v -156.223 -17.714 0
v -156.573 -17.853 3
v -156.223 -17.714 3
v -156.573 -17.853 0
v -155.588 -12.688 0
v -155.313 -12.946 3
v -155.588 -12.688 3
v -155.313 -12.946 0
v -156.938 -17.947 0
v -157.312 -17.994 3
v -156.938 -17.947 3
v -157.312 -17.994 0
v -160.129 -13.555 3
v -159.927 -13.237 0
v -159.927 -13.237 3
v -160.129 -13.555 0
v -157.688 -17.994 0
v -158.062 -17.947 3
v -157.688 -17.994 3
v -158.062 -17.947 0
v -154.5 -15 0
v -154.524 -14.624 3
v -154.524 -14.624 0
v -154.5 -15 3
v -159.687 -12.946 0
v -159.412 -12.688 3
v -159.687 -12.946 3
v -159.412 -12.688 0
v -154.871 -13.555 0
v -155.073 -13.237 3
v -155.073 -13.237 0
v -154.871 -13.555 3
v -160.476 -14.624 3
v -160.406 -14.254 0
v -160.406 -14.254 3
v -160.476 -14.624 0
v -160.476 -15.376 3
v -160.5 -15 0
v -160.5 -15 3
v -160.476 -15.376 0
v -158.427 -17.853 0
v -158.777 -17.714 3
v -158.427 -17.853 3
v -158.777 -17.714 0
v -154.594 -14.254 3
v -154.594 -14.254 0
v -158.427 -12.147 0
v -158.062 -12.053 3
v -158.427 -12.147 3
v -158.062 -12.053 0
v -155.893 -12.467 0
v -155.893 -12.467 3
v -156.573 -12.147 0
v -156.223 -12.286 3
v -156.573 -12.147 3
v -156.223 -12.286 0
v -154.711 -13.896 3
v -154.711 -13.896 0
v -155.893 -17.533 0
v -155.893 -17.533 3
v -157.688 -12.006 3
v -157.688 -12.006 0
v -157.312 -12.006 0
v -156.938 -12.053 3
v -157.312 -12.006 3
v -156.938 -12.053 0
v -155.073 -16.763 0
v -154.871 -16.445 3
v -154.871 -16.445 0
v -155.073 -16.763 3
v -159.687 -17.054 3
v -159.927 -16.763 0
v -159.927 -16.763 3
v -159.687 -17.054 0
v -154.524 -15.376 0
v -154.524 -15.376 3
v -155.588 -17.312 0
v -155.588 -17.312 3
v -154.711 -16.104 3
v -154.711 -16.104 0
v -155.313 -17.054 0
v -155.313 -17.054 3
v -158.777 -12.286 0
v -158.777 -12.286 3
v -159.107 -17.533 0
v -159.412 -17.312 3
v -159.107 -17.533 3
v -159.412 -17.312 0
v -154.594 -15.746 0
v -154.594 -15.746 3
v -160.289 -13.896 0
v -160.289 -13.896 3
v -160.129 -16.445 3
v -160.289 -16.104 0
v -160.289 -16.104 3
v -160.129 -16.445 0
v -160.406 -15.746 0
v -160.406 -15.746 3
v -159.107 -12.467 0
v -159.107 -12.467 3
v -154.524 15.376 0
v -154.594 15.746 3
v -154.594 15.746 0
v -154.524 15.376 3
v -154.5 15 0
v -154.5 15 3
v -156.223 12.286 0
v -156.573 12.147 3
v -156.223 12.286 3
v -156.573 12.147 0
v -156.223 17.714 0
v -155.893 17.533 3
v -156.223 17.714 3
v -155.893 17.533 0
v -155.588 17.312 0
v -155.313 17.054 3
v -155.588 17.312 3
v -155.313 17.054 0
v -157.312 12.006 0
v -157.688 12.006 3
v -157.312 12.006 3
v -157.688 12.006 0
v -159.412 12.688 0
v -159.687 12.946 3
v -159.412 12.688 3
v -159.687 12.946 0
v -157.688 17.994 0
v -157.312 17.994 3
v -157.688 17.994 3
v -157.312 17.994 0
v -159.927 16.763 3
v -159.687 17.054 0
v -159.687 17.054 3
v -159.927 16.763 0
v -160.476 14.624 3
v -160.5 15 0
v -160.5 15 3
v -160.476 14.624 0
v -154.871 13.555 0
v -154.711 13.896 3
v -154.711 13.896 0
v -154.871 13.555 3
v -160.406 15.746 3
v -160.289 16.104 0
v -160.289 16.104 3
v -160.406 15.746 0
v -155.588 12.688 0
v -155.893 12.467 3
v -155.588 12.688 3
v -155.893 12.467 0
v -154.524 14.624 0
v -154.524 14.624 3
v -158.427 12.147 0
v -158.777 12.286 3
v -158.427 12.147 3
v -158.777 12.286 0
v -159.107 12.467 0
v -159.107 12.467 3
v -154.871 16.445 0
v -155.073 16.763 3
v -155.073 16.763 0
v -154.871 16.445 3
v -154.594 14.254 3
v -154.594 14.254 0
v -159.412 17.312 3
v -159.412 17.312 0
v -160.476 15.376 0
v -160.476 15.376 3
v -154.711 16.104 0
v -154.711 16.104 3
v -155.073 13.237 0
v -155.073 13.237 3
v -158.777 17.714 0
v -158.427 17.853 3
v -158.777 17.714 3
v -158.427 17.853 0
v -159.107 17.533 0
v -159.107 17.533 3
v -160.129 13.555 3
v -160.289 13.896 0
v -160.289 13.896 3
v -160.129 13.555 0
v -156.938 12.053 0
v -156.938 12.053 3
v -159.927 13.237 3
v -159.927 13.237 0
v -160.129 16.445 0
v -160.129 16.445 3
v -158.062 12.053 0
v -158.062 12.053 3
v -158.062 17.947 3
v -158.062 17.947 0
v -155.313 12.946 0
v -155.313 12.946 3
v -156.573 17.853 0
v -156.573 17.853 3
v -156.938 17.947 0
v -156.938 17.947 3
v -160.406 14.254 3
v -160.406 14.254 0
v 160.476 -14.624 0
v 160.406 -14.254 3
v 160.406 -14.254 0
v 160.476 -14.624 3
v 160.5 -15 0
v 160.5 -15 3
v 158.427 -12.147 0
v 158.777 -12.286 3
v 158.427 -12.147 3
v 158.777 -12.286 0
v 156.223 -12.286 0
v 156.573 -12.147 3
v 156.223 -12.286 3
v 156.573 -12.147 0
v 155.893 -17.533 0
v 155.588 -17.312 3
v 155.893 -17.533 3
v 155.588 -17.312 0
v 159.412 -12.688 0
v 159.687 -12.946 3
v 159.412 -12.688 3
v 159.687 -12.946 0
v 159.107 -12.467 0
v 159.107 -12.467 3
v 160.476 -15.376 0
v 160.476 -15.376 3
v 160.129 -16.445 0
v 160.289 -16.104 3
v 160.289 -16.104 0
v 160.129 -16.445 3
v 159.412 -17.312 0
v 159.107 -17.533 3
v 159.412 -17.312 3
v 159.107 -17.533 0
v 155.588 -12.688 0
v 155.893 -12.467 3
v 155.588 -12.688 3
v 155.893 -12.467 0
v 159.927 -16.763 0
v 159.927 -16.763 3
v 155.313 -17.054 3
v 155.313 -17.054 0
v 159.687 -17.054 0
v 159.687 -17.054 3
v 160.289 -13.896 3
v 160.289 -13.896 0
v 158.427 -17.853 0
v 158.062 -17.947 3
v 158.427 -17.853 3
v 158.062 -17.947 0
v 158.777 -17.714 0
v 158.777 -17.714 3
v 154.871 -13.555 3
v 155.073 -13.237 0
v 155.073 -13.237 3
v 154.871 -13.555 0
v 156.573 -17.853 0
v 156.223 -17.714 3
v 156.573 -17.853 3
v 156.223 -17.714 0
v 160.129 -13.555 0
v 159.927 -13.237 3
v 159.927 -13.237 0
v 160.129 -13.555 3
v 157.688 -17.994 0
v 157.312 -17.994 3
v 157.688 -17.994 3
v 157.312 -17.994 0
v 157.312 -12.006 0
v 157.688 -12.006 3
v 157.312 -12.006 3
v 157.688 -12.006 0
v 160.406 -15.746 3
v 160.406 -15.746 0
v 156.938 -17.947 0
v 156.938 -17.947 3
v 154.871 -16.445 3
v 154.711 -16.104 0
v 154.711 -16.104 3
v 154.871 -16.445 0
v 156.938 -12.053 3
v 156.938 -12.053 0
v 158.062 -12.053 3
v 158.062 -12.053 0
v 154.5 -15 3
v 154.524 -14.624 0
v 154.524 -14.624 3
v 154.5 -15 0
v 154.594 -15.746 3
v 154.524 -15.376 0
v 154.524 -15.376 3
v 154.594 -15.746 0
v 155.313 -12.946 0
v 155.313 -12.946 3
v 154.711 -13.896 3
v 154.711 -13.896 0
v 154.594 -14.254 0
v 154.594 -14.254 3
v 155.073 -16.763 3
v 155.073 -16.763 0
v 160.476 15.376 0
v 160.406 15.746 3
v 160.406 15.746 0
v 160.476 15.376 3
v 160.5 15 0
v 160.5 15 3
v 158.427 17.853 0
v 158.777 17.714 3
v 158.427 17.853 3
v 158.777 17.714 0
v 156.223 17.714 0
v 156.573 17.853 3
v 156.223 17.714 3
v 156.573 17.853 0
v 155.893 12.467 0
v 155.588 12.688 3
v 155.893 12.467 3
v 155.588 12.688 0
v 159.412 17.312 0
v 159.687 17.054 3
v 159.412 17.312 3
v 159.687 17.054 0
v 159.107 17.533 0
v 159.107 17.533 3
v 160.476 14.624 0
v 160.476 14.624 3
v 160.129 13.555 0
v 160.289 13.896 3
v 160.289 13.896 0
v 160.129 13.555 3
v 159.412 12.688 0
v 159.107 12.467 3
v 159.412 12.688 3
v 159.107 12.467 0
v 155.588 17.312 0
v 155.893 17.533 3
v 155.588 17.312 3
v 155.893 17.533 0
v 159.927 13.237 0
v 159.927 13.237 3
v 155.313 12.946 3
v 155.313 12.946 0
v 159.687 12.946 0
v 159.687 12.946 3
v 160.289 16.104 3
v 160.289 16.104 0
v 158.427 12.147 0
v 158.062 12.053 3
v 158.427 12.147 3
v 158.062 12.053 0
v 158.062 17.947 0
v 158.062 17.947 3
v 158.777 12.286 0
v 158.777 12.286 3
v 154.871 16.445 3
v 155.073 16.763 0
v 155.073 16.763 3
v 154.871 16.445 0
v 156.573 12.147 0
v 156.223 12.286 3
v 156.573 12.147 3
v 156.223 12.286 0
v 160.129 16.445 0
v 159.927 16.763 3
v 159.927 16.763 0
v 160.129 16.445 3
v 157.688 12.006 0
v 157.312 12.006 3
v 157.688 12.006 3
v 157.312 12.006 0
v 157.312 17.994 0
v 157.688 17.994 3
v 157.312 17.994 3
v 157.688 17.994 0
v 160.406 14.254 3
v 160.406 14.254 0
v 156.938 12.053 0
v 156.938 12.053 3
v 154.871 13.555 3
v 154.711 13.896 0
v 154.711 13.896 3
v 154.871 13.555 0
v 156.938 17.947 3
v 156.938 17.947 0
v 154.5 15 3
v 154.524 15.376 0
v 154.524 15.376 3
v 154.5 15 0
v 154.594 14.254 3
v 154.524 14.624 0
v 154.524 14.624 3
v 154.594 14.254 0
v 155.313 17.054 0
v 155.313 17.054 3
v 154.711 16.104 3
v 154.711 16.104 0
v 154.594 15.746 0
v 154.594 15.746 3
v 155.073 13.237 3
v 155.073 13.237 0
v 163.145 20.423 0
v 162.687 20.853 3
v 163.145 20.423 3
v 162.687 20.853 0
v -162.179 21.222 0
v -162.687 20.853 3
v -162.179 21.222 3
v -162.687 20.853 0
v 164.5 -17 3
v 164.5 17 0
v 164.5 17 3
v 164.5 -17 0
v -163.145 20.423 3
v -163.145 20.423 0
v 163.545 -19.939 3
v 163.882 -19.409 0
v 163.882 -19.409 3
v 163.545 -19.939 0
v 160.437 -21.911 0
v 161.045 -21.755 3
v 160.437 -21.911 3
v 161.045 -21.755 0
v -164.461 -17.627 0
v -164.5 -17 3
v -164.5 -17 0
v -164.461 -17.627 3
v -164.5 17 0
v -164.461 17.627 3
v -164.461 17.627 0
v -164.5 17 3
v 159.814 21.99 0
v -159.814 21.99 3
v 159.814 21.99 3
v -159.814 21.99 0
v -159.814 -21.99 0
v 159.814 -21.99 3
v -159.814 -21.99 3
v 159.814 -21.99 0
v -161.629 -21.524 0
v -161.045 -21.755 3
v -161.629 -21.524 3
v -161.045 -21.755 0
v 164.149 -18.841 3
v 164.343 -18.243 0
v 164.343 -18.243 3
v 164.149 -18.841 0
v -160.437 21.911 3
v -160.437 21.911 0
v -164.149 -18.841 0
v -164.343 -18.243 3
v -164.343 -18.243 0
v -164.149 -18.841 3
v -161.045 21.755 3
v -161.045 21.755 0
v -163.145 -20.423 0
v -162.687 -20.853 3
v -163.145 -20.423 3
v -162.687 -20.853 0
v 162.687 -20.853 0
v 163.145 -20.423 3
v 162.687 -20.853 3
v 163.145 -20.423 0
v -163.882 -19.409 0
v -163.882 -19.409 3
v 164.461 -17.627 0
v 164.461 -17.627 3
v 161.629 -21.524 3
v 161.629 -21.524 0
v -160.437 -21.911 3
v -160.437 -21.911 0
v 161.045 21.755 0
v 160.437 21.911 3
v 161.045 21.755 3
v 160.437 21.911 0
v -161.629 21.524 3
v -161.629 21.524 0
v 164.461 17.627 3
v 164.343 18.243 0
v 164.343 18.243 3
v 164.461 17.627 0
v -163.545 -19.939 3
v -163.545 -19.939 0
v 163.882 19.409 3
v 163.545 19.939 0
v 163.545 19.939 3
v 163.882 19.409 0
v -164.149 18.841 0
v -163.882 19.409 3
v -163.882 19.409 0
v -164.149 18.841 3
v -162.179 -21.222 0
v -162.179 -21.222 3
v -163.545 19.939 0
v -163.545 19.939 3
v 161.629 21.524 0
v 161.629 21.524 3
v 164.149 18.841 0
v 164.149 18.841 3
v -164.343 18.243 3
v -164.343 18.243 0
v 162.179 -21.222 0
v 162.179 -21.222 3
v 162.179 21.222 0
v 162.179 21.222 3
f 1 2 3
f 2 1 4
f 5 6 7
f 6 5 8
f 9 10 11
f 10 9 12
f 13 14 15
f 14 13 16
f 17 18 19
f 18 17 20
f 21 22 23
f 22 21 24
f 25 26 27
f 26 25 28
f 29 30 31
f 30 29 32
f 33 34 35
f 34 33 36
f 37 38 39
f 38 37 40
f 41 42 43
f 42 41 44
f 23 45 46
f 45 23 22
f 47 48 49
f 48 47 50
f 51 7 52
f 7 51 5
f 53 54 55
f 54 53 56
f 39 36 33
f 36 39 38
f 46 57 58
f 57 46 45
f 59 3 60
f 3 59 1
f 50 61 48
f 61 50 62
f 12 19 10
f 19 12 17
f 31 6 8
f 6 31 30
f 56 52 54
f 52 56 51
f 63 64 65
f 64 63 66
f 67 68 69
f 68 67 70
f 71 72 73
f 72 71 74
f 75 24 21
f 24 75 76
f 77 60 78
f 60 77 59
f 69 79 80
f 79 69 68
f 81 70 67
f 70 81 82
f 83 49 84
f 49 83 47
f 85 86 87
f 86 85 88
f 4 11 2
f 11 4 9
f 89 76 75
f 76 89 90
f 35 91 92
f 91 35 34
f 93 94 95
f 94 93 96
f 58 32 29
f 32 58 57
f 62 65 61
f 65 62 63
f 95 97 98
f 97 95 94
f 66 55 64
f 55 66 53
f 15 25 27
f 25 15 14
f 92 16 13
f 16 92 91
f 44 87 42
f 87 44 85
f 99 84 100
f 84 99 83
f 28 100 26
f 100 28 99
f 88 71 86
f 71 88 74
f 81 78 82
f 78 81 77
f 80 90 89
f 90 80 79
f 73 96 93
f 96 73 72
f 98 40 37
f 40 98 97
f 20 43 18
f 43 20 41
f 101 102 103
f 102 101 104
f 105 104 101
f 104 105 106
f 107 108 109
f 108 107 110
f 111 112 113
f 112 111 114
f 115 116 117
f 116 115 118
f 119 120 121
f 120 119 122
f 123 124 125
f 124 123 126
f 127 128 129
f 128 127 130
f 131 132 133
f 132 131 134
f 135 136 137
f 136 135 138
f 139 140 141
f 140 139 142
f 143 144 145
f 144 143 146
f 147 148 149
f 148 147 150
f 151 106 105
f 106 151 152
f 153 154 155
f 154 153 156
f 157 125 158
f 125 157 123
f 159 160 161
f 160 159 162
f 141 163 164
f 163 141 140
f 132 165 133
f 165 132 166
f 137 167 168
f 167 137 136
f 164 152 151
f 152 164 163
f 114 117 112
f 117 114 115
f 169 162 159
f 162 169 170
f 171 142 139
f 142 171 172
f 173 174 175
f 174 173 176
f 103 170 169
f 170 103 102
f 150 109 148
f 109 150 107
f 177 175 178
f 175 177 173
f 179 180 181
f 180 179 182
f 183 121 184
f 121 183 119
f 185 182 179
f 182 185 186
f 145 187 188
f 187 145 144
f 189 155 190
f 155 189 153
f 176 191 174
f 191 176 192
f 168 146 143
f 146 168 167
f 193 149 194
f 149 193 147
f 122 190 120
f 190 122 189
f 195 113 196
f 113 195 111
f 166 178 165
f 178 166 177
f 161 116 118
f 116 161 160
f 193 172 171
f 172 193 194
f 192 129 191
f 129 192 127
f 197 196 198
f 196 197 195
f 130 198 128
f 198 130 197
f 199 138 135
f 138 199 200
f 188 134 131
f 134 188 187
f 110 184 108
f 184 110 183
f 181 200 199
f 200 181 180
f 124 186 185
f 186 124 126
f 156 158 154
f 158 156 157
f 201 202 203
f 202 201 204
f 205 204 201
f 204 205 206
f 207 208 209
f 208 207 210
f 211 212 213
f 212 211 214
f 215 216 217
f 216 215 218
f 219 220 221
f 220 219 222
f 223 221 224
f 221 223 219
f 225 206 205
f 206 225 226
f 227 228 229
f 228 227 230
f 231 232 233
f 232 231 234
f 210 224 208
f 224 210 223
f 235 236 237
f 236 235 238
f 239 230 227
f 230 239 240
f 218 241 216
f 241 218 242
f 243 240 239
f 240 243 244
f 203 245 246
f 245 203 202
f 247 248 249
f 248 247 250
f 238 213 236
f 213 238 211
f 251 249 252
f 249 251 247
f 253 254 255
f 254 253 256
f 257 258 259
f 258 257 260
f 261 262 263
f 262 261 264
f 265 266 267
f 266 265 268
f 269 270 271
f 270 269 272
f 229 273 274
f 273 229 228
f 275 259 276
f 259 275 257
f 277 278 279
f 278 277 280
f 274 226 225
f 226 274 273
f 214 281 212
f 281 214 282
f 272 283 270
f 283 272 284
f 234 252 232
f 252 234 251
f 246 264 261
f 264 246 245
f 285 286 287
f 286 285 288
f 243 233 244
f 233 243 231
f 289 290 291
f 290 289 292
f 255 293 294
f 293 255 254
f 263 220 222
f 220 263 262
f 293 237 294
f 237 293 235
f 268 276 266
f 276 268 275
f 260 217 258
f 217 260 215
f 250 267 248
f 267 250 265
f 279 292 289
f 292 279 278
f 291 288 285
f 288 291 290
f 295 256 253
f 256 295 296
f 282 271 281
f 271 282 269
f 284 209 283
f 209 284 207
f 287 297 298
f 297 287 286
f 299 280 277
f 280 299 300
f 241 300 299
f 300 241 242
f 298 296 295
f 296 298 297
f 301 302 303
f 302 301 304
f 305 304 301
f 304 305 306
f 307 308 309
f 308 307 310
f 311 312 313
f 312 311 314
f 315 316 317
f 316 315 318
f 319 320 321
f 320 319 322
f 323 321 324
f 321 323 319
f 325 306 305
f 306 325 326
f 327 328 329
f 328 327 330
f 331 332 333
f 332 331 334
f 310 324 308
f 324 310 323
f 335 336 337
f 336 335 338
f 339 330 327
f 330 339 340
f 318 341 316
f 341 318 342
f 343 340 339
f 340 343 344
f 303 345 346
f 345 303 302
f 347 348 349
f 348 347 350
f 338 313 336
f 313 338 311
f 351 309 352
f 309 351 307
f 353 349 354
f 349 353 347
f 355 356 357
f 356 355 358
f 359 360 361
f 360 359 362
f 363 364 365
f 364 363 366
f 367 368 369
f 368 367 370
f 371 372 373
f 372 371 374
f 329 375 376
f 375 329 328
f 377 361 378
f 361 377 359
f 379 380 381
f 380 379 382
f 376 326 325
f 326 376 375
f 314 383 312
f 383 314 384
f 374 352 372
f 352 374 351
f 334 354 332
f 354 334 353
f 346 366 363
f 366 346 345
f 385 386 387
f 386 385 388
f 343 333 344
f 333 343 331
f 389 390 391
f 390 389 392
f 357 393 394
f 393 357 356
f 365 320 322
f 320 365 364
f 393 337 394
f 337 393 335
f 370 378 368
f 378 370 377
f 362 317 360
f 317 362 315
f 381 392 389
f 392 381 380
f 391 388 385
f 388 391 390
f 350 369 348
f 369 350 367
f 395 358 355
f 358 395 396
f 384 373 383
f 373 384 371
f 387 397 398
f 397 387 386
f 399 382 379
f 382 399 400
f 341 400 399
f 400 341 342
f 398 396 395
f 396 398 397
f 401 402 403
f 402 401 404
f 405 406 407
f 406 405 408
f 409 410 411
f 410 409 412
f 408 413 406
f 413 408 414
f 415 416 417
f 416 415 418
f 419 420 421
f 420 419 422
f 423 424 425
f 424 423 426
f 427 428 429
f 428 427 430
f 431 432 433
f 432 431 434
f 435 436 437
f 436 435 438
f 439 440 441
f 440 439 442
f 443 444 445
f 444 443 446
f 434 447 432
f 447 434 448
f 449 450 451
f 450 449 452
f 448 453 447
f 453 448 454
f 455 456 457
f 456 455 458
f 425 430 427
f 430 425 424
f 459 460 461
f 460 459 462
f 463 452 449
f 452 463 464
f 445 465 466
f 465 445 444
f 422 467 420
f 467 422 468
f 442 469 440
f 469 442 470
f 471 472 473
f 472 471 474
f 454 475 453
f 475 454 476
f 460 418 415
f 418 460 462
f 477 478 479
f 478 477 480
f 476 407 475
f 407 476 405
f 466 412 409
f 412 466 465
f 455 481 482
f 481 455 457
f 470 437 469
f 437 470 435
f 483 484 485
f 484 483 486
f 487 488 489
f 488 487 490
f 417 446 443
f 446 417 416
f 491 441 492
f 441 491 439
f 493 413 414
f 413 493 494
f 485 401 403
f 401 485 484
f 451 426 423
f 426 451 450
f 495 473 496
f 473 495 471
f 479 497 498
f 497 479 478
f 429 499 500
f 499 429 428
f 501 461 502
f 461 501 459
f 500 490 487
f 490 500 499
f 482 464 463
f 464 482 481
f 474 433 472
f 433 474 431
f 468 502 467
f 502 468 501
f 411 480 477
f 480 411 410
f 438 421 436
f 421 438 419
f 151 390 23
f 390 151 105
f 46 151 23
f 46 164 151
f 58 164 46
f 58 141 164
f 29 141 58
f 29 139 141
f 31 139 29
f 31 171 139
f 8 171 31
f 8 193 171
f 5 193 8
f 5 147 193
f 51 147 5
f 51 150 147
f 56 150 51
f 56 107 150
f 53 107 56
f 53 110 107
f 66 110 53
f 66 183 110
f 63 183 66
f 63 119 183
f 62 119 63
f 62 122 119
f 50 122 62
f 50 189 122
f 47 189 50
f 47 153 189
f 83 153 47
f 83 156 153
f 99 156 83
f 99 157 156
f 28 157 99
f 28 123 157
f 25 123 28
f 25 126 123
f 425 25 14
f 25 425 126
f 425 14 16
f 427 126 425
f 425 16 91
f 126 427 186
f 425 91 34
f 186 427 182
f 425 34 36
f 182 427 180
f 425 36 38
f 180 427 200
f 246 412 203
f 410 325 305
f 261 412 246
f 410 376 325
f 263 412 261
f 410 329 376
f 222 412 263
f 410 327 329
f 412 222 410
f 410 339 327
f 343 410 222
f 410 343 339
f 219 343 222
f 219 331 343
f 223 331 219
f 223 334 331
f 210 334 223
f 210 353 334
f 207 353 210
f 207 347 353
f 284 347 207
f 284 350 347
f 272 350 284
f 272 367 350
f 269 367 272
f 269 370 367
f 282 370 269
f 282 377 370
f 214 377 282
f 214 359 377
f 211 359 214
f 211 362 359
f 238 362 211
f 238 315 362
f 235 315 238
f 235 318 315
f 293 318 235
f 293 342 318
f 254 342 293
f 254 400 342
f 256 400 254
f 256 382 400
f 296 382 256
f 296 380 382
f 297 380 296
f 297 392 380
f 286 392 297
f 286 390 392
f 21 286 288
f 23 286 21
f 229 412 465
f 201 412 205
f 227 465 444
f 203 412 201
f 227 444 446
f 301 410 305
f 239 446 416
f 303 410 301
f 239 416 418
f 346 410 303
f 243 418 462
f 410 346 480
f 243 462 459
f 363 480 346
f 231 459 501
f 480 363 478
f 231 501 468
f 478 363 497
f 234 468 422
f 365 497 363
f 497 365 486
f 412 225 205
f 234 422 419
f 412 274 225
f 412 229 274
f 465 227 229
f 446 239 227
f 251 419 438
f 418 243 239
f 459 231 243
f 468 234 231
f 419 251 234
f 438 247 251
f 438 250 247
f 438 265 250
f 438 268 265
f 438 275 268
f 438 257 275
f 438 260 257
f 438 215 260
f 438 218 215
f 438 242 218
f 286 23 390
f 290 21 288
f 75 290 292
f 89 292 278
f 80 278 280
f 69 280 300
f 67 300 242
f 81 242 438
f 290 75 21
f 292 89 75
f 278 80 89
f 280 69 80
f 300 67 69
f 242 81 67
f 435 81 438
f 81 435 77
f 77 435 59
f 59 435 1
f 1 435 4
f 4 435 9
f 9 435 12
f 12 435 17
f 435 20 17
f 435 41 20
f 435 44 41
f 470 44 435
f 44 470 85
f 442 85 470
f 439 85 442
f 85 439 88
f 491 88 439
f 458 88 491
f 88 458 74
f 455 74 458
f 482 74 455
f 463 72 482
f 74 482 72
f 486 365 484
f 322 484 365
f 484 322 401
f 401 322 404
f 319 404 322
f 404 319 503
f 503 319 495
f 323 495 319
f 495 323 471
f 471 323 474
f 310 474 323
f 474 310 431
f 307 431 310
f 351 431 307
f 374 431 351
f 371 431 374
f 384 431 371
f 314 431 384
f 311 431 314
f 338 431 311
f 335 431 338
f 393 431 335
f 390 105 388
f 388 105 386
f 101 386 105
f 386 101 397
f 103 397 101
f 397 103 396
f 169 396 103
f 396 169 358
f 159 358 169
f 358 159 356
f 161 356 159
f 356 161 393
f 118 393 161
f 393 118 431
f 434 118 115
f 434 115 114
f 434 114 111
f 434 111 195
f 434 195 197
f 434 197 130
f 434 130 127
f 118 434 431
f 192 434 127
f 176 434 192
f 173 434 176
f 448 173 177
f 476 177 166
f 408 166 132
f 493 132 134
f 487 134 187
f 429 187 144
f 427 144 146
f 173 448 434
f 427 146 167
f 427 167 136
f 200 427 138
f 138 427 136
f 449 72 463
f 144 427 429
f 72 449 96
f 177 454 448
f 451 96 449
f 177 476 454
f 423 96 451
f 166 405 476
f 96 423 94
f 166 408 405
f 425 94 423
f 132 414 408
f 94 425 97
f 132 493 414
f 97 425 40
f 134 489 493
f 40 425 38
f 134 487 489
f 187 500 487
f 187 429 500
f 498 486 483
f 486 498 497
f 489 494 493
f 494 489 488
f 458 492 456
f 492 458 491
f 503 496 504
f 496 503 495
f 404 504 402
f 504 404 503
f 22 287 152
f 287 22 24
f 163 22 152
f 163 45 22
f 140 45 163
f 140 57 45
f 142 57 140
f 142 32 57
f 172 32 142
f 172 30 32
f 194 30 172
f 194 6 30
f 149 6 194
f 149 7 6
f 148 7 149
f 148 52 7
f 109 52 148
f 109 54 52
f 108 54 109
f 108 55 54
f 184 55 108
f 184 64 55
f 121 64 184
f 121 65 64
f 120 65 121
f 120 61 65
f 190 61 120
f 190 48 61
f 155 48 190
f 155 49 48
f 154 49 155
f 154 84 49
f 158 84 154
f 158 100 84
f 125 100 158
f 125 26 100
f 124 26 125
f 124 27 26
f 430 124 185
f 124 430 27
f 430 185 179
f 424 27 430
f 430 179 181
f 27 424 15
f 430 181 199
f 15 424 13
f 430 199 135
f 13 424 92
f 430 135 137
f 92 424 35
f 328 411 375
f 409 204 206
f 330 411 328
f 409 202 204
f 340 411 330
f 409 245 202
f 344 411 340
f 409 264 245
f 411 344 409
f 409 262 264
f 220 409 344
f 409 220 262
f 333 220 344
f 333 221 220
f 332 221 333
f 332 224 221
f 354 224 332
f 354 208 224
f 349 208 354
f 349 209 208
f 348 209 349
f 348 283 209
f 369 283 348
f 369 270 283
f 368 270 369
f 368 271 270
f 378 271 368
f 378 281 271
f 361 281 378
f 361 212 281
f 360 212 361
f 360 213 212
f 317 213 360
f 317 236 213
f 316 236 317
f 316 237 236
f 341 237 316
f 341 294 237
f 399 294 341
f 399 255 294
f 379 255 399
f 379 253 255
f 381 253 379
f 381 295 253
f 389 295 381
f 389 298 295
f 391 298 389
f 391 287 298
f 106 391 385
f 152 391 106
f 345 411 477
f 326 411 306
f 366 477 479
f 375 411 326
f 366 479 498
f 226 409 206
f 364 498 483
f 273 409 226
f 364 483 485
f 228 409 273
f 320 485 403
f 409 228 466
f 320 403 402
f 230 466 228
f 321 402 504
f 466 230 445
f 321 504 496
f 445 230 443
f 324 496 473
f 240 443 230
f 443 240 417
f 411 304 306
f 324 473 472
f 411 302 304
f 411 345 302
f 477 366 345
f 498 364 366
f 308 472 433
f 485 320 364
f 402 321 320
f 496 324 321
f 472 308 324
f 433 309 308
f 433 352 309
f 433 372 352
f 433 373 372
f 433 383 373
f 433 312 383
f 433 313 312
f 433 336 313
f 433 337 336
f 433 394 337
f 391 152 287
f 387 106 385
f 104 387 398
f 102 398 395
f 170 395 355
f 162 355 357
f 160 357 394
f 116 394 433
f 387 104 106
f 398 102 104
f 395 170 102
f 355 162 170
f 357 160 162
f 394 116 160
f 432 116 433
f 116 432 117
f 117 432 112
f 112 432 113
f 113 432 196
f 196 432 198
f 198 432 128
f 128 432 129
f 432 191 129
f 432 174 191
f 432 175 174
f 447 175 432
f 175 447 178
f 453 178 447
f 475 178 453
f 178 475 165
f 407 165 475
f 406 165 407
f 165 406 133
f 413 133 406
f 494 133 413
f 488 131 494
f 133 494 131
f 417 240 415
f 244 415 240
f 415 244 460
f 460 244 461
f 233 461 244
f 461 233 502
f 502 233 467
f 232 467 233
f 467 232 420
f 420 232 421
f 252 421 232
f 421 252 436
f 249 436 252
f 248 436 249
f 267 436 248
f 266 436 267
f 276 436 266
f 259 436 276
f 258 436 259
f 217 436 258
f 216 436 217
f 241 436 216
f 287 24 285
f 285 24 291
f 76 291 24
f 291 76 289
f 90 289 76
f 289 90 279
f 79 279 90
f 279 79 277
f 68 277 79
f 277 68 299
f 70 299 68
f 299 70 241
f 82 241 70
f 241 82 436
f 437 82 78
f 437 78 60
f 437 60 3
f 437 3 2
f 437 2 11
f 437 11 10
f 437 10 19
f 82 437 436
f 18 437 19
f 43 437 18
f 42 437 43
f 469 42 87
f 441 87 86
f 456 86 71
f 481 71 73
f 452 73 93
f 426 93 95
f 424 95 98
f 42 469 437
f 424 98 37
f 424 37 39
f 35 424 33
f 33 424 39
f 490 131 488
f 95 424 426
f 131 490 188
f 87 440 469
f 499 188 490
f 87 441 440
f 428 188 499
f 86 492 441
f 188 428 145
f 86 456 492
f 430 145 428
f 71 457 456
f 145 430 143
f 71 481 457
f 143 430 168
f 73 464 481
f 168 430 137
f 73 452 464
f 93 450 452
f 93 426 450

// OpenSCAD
$fn = 50;


difference() {
	union() {
		hull() {
			translate(v = [-159.5000000000, 17.0000000000, 0]) {
				cylinder(h = 3, r = 5);
			}
			translate(v = [159.5000000000, 17.0000000000, 0]) {
				cylinder(h = 3, r = 5);
			}
			translate(v = [-159.5000000000, -17.0000000000, 0]) {
				cylinder(h = 3, r = 5);
			}
			translate(v = [159.5000000000, -17.0000000000, 0]) {
				cylinder(h = 3, r = 5);
			}
		}
	}
	union() {
		translate(v = [-157.5000000000, -15.0000000000, -100.0000000000]) {
			cylinder(h = 200, r = 3.0000000000);
		}
		translate(v = [-157.5000000000, 15.0000000000, -100.0000000000]) {
			cylinder(h = 200, r = 3.0000000000);
		}
		translate(v = [157.5000000000, -15.0000000000, -100.0000000000]) {
			cylinder(h = 200, r = 3.0000000000);
		}
		translate(v = [157.5000000000, 15.0000000000, -100.0000000000]) {
			cylinder(h = 200, r = 3.0000000000);
		}
	}
}
